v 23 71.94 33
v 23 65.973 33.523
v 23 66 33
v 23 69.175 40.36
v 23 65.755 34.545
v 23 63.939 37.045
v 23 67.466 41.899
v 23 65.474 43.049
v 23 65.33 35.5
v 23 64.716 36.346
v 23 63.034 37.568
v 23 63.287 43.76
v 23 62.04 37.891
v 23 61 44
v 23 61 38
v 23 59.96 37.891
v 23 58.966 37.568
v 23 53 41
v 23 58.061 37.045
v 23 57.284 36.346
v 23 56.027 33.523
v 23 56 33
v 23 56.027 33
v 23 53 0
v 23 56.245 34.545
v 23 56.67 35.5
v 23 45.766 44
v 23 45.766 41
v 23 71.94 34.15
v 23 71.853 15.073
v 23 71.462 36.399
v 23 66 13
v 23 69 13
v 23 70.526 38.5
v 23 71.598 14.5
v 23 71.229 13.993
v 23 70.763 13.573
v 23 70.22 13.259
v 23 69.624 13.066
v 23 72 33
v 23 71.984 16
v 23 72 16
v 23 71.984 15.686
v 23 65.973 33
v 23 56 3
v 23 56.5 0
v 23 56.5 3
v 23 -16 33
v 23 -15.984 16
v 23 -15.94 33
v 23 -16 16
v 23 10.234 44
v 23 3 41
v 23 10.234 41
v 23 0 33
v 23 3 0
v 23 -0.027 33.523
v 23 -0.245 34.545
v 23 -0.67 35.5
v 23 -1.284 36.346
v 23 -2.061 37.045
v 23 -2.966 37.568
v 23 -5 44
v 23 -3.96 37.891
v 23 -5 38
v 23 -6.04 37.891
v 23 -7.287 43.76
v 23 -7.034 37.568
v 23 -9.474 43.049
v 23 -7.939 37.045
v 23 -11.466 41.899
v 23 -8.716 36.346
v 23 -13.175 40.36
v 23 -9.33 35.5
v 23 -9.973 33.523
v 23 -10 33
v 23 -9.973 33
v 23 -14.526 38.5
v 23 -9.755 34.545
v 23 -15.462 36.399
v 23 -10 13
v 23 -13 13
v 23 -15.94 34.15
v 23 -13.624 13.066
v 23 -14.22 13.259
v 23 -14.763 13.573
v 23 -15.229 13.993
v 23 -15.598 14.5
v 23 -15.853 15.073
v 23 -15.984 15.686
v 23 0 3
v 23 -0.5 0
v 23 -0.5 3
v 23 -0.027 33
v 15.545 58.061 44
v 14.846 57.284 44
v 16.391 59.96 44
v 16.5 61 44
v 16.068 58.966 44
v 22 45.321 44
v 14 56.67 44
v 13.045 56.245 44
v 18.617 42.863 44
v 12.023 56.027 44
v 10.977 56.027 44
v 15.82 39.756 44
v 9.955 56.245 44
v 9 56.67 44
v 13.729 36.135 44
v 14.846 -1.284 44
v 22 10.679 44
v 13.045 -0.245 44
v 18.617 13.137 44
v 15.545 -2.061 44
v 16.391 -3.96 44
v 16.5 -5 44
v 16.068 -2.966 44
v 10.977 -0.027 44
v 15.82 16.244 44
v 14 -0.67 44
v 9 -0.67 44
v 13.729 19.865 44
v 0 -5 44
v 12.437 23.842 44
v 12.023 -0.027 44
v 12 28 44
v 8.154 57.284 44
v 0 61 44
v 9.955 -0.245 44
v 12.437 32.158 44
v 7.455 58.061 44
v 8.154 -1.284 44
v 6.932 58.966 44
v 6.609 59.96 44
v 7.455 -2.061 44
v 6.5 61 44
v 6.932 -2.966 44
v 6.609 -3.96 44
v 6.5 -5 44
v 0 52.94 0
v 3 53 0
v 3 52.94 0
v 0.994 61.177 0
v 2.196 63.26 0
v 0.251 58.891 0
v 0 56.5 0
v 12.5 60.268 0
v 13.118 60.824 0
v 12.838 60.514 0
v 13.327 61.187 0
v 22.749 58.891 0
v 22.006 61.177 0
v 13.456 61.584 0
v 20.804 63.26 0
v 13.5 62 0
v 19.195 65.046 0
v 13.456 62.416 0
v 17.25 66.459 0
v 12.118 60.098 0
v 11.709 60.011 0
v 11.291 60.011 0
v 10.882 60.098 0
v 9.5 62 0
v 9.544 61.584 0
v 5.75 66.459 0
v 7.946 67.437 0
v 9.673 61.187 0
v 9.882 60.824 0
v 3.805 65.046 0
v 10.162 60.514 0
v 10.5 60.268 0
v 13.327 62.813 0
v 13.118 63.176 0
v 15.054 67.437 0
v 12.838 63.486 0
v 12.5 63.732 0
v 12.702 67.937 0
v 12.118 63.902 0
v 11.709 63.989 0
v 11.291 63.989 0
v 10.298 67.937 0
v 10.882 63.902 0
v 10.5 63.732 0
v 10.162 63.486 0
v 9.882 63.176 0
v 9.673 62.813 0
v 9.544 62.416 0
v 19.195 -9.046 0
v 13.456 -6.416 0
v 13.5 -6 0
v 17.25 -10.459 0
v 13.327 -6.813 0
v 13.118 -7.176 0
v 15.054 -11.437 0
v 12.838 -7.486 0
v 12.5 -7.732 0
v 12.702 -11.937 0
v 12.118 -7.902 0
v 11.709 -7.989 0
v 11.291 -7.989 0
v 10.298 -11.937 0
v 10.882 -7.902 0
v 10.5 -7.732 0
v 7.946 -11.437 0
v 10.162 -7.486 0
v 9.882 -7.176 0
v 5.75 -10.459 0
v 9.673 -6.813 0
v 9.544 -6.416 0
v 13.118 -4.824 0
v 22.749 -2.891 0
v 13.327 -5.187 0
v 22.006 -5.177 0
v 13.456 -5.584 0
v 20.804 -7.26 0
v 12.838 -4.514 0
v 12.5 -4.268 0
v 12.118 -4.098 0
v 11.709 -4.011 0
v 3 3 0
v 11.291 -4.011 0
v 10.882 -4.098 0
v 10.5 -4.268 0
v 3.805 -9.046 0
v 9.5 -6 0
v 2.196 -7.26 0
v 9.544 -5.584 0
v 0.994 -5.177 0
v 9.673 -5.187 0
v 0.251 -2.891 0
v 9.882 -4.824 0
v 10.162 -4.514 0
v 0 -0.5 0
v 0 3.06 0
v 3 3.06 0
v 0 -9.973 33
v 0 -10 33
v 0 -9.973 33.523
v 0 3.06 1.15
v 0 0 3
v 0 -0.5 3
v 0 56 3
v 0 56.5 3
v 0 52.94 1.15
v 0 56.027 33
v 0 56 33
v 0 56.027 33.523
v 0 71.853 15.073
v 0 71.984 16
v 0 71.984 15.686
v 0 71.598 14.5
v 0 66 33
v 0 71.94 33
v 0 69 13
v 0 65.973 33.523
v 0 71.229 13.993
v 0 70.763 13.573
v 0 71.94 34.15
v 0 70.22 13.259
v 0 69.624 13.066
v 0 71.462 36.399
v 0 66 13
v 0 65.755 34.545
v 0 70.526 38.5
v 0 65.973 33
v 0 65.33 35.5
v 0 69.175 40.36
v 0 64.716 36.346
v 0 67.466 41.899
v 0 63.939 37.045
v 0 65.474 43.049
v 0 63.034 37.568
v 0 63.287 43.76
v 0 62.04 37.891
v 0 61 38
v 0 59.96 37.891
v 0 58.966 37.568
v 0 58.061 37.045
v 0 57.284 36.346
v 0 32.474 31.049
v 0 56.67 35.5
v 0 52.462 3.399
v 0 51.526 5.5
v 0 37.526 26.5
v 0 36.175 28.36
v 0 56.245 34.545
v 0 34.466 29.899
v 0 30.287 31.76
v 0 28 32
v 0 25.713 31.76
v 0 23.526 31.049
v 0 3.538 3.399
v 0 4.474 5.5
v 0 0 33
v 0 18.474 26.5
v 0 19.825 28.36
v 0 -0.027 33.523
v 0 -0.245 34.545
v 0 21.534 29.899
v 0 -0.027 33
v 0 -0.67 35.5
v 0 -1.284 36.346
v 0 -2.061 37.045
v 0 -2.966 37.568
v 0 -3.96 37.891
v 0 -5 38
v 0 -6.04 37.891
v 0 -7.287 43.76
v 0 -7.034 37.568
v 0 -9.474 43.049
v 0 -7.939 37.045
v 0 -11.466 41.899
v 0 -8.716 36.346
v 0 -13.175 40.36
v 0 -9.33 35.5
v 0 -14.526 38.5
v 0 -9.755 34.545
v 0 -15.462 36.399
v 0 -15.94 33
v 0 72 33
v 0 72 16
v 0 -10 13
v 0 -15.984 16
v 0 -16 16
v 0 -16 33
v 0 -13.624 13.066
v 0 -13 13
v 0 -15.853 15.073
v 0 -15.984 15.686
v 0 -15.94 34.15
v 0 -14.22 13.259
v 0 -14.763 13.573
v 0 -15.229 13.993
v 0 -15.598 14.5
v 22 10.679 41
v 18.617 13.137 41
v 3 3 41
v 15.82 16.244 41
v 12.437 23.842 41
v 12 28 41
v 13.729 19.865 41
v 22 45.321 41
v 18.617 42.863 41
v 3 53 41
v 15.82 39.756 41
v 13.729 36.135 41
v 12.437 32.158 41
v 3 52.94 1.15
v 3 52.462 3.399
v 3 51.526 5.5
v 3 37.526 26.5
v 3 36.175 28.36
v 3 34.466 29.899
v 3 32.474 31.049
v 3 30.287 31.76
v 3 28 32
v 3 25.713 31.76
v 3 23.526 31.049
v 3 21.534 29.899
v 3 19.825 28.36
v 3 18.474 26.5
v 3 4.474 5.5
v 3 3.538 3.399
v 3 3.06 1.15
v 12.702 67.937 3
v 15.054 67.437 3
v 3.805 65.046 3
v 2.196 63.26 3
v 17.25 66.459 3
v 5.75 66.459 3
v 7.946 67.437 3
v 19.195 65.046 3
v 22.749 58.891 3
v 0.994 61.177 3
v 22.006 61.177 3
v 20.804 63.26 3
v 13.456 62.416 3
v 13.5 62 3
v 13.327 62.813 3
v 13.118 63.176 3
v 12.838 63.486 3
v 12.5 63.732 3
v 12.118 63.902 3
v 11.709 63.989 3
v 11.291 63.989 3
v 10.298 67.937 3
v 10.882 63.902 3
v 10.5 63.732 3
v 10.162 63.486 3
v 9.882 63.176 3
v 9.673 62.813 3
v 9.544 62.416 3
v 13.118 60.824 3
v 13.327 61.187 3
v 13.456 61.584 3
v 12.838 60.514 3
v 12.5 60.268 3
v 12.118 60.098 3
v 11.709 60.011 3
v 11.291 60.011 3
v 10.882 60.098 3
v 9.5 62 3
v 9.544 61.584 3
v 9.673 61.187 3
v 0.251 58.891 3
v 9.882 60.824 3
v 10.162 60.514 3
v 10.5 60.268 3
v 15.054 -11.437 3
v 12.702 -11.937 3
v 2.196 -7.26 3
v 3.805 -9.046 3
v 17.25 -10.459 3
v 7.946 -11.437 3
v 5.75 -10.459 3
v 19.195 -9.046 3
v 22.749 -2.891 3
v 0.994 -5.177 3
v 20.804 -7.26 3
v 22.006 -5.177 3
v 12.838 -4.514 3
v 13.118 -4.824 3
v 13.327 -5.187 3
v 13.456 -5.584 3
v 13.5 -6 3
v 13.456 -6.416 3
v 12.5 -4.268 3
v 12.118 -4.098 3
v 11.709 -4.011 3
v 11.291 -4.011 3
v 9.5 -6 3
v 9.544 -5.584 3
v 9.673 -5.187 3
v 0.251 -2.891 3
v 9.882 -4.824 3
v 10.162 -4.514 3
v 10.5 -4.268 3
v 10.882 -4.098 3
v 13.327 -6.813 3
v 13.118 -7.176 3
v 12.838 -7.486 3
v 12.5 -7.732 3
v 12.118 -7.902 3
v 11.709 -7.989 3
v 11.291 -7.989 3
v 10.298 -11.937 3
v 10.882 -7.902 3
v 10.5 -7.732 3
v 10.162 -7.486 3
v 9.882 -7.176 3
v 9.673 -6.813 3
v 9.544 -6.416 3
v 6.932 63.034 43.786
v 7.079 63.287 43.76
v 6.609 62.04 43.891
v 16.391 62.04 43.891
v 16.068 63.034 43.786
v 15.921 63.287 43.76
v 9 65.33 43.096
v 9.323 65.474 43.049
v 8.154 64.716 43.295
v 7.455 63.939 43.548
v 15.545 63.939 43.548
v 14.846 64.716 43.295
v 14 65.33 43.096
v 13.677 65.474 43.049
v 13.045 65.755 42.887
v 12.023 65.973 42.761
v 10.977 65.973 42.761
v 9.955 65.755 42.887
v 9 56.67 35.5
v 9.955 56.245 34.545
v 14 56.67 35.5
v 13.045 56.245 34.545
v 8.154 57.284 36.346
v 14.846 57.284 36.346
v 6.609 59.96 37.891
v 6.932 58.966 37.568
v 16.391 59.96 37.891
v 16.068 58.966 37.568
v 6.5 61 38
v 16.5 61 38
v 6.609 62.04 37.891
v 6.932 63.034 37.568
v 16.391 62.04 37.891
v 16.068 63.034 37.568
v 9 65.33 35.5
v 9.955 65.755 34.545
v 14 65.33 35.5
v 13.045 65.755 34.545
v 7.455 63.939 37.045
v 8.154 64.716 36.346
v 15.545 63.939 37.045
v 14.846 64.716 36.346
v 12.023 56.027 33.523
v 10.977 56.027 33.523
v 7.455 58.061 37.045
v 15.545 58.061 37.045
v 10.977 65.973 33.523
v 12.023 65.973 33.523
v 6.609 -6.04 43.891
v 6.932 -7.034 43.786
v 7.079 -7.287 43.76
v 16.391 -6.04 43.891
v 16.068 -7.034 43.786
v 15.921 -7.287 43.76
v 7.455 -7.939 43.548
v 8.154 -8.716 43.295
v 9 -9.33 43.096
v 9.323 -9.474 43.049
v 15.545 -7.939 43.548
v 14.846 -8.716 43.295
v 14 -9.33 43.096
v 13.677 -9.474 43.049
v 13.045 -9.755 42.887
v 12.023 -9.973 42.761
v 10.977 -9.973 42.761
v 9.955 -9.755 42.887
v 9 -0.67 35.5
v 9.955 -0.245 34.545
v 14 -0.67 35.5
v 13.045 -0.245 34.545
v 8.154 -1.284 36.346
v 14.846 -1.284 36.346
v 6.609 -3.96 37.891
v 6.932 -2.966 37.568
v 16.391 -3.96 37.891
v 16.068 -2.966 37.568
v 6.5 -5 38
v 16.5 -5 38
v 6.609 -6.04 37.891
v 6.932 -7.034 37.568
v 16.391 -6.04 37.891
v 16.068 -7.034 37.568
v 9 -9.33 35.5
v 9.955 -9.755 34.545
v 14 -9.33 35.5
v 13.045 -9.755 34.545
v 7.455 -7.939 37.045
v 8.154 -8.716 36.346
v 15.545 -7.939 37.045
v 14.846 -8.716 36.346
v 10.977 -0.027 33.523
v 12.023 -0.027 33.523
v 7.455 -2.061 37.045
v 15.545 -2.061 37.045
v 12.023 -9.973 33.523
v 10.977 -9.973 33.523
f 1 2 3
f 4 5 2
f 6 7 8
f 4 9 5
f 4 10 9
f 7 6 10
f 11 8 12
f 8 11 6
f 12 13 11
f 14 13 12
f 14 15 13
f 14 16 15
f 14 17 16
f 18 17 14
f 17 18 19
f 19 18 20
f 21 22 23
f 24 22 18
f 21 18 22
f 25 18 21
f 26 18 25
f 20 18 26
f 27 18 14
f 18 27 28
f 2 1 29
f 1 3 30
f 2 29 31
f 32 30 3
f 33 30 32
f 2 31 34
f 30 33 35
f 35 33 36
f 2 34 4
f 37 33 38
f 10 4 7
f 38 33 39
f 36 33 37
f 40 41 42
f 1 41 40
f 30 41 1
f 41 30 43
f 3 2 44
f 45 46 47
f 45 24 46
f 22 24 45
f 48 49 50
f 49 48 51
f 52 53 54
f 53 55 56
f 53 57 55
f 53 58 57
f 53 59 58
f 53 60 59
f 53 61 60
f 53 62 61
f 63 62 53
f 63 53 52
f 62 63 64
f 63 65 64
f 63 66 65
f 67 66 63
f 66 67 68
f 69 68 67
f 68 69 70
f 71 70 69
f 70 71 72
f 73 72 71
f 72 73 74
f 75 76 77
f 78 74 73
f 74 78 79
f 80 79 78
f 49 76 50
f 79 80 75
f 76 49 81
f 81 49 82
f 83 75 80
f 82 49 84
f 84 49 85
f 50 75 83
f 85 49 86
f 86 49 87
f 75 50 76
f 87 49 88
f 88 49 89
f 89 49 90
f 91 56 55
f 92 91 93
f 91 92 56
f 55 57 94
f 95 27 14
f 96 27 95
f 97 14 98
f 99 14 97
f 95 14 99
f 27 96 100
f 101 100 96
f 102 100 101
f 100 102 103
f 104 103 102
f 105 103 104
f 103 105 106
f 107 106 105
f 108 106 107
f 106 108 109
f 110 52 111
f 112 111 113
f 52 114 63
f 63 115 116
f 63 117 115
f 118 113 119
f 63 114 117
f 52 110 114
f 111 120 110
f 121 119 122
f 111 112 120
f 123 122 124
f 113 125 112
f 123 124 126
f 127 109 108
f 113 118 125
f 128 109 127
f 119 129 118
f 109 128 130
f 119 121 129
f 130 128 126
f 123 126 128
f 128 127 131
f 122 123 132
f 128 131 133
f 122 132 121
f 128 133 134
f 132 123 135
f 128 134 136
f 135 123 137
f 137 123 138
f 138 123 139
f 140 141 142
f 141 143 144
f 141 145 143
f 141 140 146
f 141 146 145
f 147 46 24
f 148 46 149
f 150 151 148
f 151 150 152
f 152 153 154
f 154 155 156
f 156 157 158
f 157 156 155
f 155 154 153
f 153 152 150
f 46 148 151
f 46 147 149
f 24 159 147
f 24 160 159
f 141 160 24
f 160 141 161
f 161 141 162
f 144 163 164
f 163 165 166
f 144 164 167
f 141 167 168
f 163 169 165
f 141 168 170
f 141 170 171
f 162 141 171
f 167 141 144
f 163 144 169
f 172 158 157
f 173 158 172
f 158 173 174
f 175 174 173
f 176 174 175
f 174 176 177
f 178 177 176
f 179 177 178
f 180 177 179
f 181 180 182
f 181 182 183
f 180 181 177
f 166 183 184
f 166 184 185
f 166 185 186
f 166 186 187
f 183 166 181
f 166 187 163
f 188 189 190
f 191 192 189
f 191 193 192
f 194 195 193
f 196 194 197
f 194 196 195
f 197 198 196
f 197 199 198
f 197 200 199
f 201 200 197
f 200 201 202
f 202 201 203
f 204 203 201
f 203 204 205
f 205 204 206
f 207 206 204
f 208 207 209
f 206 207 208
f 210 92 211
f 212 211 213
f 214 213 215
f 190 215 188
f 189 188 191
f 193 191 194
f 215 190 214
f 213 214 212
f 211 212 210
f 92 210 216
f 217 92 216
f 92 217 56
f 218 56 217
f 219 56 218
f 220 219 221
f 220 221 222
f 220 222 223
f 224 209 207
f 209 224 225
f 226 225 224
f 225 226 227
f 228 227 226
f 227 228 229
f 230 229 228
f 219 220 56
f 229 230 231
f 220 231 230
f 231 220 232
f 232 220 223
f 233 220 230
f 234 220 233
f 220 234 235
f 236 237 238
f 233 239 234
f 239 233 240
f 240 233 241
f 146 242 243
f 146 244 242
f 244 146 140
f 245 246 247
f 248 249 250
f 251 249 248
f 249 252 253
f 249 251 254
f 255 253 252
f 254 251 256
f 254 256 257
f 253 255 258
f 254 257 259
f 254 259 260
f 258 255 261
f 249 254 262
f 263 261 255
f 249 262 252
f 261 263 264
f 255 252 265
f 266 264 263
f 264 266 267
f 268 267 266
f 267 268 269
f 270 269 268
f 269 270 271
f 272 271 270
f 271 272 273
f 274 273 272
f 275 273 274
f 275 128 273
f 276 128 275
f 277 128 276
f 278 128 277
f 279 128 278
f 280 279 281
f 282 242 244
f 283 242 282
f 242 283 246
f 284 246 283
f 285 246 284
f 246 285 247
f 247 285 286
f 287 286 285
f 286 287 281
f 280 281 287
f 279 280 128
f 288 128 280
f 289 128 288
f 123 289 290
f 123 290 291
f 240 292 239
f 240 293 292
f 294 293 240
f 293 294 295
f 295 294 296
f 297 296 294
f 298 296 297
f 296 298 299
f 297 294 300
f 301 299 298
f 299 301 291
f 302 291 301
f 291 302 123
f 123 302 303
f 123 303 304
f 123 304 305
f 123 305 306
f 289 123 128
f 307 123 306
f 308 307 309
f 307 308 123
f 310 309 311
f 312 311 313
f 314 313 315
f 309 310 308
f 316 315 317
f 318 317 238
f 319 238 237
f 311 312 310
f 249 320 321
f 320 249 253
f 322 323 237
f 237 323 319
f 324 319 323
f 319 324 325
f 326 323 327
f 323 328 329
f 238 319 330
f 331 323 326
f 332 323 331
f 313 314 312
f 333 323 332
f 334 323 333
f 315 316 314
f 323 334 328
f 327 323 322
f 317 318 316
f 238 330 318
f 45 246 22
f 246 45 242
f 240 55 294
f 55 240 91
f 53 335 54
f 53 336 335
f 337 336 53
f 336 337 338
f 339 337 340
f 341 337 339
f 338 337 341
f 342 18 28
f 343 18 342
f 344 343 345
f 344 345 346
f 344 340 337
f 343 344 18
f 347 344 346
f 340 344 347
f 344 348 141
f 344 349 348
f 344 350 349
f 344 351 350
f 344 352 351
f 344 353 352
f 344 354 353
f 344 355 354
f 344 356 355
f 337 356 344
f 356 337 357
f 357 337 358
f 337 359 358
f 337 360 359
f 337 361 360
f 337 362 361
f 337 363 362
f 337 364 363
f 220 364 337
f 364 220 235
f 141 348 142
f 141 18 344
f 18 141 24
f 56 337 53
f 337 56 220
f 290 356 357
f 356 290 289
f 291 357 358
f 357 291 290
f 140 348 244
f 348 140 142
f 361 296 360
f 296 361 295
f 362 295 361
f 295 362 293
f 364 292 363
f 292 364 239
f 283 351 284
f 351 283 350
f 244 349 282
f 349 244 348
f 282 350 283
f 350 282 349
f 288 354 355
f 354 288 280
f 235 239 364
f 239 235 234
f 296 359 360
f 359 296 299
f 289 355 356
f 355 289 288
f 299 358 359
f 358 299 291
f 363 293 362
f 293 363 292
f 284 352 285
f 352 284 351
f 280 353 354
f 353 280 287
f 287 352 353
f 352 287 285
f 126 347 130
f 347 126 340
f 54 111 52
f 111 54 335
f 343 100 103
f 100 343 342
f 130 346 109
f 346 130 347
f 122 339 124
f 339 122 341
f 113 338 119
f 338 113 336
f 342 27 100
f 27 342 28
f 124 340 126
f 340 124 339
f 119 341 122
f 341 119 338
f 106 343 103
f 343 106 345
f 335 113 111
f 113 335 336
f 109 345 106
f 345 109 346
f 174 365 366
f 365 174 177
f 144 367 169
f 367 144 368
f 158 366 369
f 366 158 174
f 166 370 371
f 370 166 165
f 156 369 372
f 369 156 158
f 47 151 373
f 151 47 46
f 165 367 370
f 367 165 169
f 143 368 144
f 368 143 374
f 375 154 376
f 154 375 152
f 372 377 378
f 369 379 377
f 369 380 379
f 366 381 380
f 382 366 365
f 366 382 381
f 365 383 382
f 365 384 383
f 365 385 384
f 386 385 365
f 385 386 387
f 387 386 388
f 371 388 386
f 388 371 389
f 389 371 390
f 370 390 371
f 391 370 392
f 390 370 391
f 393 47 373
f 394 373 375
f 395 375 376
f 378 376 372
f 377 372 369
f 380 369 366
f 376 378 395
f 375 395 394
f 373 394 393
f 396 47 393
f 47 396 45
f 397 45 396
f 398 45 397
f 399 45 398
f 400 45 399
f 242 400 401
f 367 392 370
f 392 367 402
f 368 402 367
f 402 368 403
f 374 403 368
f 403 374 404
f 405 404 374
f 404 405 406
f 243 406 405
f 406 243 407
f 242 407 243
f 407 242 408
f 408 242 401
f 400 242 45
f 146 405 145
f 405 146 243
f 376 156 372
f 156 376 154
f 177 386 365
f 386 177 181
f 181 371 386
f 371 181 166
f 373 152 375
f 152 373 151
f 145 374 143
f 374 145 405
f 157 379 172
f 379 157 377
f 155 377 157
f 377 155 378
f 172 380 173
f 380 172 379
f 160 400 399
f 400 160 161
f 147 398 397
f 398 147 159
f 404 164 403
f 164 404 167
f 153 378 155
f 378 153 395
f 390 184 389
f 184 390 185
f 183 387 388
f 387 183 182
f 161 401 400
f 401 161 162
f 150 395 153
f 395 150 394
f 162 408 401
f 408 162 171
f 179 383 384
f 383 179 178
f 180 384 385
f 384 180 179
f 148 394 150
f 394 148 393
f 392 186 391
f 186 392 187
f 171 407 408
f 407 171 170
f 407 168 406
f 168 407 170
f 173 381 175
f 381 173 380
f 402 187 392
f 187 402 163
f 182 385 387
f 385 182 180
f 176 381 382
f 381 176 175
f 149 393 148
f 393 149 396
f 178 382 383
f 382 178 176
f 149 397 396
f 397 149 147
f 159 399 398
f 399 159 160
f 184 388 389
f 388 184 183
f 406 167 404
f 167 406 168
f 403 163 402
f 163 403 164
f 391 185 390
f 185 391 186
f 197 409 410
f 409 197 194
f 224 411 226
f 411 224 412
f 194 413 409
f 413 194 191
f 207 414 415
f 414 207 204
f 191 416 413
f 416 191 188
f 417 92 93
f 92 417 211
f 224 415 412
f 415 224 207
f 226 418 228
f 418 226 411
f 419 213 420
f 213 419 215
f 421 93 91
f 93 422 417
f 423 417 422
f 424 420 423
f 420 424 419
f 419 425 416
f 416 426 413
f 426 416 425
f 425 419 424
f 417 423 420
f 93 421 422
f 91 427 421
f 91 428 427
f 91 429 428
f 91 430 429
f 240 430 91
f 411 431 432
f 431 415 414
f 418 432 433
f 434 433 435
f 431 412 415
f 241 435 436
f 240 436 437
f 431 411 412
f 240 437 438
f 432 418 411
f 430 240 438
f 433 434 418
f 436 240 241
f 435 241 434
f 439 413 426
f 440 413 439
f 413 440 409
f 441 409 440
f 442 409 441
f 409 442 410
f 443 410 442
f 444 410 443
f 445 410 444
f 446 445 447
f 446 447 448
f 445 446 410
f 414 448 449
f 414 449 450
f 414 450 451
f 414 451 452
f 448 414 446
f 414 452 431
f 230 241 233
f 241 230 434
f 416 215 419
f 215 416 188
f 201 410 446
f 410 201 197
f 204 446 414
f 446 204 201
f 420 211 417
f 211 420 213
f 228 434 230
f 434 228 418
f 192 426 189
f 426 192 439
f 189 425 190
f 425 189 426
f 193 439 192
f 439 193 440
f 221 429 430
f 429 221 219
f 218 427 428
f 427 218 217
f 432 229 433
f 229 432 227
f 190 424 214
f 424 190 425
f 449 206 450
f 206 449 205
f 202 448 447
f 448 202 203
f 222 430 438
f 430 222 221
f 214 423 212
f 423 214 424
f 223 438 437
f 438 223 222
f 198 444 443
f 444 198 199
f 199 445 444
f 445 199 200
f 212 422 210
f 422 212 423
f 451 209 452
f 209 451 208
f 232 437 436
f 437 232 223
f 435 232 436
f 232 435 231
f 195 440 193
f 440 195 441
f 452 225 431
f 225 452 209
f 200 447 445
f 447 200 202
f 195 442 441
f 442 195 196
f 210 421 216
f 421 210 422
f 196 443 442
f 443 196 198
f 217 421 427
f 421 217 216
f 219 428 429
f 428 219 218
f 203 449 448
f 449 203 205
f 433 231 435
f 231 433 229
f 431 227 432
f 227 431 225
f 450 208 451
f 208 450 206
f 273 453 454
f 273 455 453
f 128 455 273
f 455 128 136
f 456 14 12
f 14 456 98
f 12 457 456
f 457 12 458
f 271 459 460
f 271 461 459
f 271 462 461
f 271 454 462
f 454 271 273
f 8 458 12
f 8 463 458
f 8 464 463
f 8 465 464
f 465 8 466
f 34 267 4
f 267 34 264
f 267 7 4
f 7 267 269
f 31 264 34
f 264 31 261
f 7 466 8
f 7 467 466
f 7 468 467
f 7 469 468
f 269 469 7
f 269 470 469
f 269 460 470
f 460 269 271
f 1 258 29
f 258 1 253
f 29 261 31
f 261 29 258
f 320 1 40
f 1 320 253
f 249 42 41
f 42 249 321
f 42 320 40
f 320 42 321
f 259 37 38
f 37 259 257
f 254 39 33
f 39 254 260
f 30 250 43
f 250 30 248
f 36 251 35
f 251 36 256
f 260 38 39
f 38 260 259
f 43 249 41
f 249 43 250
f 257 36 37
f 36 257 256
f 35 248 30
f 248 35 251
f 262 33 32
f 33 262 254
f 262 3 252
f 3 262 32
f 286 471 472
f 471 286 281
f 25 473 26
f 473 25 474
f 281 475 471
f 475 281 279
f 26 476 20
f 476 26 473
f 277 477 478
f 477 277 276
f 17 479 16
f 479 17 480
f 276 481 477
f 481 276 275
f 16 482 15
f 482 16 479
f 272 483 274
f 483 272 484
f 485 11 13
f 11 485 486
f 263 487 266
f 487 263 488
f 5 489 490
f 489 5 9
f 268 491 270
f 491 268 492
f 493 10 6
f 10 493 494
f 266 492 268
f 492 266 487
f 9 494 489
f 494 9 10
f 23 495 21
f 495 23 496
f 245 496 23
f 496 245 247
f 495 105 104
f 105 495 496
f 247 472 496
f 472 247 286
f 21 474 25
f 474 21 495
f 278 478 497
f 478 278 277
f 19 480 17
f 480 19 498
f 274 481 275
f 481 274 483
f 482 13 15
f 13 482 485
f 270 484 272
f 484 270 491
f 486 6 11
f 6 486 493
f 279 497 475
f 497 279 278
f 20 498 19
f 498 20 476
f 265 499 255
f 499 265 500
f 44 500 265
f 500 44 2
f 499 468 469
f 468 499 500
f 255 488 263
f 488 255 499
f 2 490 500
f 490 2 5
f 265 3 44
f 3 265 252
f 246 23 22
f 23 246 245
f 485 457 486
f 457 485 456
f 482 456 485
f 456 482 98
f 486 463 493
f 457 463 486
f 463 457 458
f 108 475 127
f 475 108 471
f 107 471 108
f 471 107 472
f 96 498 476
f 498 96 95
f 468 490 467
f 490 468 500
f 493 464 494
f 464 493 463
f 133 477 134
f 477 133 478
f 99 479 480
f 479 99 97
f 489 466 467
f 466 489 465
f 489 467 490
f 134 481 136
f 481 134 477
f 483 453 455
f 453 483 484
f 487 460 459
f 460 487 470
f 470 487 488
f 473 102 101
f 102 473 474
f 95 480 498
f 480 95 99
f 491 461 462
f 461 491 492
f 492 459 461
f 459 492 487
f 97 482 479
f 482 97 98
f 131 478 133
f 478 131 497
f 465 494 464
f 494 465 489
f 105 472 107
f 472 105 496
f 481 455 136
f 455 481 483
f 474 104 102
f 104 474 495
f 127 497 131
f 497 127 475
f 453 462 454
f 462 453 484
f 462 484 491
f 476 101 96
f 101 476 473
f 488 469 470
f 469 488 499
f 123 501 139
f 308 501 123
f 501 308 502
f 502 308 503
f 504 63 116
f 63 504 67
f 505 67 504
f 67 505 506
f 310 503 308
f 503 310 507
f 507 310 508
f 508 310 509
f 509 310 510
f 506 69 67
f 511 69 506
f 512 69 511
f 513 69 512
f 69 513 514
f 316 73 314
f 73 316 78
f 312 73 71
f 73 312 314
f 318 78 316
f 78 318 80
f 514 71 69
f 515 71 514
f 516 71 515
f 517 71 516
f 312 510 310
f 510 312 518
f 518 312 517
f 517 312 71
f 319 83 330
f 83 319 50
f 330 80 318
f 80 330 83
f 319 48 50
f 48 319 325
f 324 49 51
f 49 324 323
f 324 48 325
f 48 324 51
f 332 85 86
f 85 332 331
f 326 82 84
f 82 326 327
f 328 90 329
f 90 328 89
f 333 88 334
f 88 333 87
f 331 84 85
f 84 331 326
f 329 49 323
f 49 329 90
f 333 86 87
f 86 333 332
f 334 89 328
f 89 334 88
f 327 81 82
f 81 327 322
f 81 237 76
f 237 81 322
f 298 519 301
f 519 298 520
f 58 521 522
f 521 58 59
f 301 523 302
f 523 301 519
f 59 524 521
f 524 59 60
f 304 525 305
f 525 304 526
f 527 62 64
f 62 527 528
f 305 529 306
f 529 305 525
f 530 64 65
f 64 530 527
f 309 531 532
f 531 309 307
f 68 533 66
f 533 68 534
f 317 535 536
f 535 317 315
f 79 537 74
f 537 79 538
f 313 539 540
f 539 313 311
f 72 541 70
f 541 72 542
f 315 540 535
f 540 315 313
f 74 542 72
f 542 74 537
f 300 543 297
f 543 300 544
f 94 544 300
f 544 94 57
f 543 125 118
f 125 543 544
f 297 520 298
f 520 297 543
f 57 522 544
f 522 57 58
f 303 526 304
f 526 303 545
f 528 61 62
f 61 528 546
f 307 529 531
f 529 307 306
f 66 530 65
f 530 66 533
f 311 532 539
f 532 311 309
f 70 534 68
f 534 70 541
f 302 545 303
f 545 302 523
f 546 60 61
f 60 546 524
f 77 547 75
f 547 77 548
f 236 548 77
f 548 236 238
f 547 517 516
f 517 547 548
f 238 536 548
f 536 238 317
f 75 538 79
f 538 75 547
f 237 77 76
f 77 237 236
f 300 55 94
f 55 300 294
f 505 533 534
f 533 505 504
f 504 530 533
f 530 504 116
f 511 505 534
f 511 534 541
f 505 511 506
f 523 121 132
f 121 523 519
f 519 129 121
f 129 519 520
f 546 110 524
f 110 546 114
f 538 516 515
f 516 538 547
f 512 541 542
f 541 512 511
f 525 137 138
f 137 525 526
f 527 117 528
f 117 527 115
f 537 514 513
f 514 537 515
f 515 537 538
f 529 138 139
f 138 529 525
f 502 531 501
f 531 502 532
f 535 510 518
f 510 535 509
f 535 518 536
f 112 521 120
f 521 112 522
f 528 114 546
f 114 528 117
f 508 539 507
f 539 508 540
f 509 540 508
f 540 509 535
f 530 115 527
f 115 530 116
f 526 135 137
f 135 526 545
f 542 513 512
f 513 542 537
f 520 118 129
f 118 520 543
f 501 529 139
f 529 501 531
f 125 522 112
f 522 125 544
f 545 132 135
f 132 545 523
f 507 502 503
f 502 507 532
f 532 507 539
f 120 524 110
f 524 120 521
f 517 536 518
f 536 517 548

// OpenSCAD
/* [Hidden] */
$fs=0.1;

/* [Global] */
// The width of your socket
socket_width=50; 

// The height of your socket
socket_height=41;

// How far should your socket be covered in total?
overlay=20;


/* [Cable holder] */
// Cableholder on the left ?
cable_holder_right = true;

// Cable holder on th eright?
cable_holder_left = true;

// Thickness of the Cable holder
cable_holder_thickness = 6;

// Distance to cable holder
cable_holder_width = 10;


/* [Plug cuts] */
// Offset from the end of the socket to the beginning of the round cut
outlet_cut_round_offset=9; 

// Diameter of the round cut (0=disabled) (Schuko=41)
outlet_cut_diameter=40; 


// Offset from the end of the socket to the beginning of the rectangular cut
switch_cut_rect_offset=0; 

// Diameter of the rectangular cut (0=disabled)
switch_cut_rect_width=0; 


/* [Cable outlet cuts] */

// Distance from the bottom of the socket to the top of the cable
cable_top_offset=32;

// Diameter of the cable cut
cable_diameter=22; 


/* [Other] */
// Wall thickness
thickness=3; 

// Diameter of the screw holde
screw_diameter = 4; 


outerwidth=socket_width+2*thickness;
outerheight=socket_height+thickness;
outerdepth=overlay+thickness;

cableholderheight = outerheight-cable_holder_width-thickness;



render () {
difference () {
    cube([outerdepth,outerwidth,outerheight]);
    translate([thickness,thickness,0])
        cube([overlay,socket_width,socket_height]);

    // cable outlet
    hull()
    {
        translate ([0,outerwidth/2,cable_top_offset-cable_diameter/2])
            rotate ([0,90,0])
                cylinder (h=thickness*2,r=cable_diameter/2,center=false);

        translate ([0,thickness+cable_diameter/2,0])
            rotate ([0,90,0])
                cylinder (h=thickness*2,r=cable_diameter/2,center=false);

        translate ([0,outerwidth-(thickness+cable_diameter/2),0])
            rotate ([0,90,0])
                cylinder (h=thickness*2,r=cable_diameter/2);
    
    }
    
    // socketcut round
    translate ([outlet_cut_round_offset+thickness+outlet_cut_diameter/2,outerwidth/2,outerheight-thickness])
        cylinder (h=thickness*2,r=outlet_cut_diameter/2);
    
    
    // socketcut rectangular
    translate ([switch_cut_rect_offset+thickness,(outerwidth-switch_cut_rect_width)/2,outerheight-thickness])
        cube ([overlay,switch_cut_rect_width,thickness*2]);
}


//srewfix right
translate([0,outerwidth],0)
    screwfix(outerdepth,thickness,screw_diameter);

//screwfix left
mirror([0,1,0])
    screwfix(outerdepth,thickness,screw_diameter);


//cableholder right
if (cable_holder_right)
{
translate([0,outerwidth,outerheight])
    cableholder(cable_holder_width,cable_holder_thickness,
    cableholderheight,
    outerdepth,
    screw_diameter*2.5);    // change this factor to adjust the screw driver width
}

//cableholder left
if (cable_holder_left)
{
    translate([0,0,outerheight])
        mirror([0,1,0])
        cableholder(cable_holder_width,cable_holder_thickness,
        cableholderheight,
        outerdepth,
        screw_diameter*2.5);    // change this factor to adjust the screw driver width
}
}


module cableholder (
    width,
    cthickness,
    height,
    depth,
    dia)
{
    outerradius = width/2+cthickness; 

    // Point zero at top left corner
    difference(){
        union() {
            // top cylinder
            translate ([0,width/2,(width/2+cthickness)*-1])
                rotate ([0,90,0])
                    cylinder (h=depth,r=outerradius);
           
            // fill corner on cylinder
            translate ([0,0,(width/2+cthickness)*-1])
                cube ([depth,width/2,outerradius]);
            
            // main bar
            translate ([0,0,cthickness/2-height])
                cube ([depth,width+cthickness,height-outerradius-cthickness/2]);
            
            // main bar lower rounding
            translate ([0,width+cthickness/2,cthickness/2-height])
                rotate ([0,90,0])
                    cylinder (h=depth,r=cthickness/2);
            
            // corner out main bar rounding
            translate([0,width,height*-1])
                cube([depth,cthickness/2,cthickness/2]);
        }

        //top inner rounding
        translate ([0,width/2,(width/2+cthickness)*-1])
            rotate ([0,90,0])
                cylinder (h=depth*2,r=width/2);
        // main inner space
        translate ([0,0,(height+width)*-1])
            cube ([depth,width,height+width/2-cthickness]);
        
        // screwslot
        translate ([(depth)/2, max(width/2,dia/2),height*-1])
                cylinder (h=height,r=dia/2);   
        
        // remove overhanging cylinder  
        translate([0,outerradius*-1,outerradius*-2])
            cube ([depth,outerradius,outerradius*2]); 
    }
}
    


module screwfix(width,height,diameter) {
    length=3*diameter;
    radius=min(length,width/2);
    difference(){
        hull() {
            cube([width,length-radius,height]);
            
            translate ([width-radius,length-radius,0]) 
                cylinder (h=height,r=radius);
            translate ([radius,length-radius,0]) 
                cylinder (h=height,r=radius);
       };
       // screwholes
       translate ([(width)/2,length/2,0]) 
            cylinder(h=height,r=diameter/2);
       
       // remove leftover from rounding
       translate ([0,radius*-1,0])
            cube([width,radius,height]);
    }
}
